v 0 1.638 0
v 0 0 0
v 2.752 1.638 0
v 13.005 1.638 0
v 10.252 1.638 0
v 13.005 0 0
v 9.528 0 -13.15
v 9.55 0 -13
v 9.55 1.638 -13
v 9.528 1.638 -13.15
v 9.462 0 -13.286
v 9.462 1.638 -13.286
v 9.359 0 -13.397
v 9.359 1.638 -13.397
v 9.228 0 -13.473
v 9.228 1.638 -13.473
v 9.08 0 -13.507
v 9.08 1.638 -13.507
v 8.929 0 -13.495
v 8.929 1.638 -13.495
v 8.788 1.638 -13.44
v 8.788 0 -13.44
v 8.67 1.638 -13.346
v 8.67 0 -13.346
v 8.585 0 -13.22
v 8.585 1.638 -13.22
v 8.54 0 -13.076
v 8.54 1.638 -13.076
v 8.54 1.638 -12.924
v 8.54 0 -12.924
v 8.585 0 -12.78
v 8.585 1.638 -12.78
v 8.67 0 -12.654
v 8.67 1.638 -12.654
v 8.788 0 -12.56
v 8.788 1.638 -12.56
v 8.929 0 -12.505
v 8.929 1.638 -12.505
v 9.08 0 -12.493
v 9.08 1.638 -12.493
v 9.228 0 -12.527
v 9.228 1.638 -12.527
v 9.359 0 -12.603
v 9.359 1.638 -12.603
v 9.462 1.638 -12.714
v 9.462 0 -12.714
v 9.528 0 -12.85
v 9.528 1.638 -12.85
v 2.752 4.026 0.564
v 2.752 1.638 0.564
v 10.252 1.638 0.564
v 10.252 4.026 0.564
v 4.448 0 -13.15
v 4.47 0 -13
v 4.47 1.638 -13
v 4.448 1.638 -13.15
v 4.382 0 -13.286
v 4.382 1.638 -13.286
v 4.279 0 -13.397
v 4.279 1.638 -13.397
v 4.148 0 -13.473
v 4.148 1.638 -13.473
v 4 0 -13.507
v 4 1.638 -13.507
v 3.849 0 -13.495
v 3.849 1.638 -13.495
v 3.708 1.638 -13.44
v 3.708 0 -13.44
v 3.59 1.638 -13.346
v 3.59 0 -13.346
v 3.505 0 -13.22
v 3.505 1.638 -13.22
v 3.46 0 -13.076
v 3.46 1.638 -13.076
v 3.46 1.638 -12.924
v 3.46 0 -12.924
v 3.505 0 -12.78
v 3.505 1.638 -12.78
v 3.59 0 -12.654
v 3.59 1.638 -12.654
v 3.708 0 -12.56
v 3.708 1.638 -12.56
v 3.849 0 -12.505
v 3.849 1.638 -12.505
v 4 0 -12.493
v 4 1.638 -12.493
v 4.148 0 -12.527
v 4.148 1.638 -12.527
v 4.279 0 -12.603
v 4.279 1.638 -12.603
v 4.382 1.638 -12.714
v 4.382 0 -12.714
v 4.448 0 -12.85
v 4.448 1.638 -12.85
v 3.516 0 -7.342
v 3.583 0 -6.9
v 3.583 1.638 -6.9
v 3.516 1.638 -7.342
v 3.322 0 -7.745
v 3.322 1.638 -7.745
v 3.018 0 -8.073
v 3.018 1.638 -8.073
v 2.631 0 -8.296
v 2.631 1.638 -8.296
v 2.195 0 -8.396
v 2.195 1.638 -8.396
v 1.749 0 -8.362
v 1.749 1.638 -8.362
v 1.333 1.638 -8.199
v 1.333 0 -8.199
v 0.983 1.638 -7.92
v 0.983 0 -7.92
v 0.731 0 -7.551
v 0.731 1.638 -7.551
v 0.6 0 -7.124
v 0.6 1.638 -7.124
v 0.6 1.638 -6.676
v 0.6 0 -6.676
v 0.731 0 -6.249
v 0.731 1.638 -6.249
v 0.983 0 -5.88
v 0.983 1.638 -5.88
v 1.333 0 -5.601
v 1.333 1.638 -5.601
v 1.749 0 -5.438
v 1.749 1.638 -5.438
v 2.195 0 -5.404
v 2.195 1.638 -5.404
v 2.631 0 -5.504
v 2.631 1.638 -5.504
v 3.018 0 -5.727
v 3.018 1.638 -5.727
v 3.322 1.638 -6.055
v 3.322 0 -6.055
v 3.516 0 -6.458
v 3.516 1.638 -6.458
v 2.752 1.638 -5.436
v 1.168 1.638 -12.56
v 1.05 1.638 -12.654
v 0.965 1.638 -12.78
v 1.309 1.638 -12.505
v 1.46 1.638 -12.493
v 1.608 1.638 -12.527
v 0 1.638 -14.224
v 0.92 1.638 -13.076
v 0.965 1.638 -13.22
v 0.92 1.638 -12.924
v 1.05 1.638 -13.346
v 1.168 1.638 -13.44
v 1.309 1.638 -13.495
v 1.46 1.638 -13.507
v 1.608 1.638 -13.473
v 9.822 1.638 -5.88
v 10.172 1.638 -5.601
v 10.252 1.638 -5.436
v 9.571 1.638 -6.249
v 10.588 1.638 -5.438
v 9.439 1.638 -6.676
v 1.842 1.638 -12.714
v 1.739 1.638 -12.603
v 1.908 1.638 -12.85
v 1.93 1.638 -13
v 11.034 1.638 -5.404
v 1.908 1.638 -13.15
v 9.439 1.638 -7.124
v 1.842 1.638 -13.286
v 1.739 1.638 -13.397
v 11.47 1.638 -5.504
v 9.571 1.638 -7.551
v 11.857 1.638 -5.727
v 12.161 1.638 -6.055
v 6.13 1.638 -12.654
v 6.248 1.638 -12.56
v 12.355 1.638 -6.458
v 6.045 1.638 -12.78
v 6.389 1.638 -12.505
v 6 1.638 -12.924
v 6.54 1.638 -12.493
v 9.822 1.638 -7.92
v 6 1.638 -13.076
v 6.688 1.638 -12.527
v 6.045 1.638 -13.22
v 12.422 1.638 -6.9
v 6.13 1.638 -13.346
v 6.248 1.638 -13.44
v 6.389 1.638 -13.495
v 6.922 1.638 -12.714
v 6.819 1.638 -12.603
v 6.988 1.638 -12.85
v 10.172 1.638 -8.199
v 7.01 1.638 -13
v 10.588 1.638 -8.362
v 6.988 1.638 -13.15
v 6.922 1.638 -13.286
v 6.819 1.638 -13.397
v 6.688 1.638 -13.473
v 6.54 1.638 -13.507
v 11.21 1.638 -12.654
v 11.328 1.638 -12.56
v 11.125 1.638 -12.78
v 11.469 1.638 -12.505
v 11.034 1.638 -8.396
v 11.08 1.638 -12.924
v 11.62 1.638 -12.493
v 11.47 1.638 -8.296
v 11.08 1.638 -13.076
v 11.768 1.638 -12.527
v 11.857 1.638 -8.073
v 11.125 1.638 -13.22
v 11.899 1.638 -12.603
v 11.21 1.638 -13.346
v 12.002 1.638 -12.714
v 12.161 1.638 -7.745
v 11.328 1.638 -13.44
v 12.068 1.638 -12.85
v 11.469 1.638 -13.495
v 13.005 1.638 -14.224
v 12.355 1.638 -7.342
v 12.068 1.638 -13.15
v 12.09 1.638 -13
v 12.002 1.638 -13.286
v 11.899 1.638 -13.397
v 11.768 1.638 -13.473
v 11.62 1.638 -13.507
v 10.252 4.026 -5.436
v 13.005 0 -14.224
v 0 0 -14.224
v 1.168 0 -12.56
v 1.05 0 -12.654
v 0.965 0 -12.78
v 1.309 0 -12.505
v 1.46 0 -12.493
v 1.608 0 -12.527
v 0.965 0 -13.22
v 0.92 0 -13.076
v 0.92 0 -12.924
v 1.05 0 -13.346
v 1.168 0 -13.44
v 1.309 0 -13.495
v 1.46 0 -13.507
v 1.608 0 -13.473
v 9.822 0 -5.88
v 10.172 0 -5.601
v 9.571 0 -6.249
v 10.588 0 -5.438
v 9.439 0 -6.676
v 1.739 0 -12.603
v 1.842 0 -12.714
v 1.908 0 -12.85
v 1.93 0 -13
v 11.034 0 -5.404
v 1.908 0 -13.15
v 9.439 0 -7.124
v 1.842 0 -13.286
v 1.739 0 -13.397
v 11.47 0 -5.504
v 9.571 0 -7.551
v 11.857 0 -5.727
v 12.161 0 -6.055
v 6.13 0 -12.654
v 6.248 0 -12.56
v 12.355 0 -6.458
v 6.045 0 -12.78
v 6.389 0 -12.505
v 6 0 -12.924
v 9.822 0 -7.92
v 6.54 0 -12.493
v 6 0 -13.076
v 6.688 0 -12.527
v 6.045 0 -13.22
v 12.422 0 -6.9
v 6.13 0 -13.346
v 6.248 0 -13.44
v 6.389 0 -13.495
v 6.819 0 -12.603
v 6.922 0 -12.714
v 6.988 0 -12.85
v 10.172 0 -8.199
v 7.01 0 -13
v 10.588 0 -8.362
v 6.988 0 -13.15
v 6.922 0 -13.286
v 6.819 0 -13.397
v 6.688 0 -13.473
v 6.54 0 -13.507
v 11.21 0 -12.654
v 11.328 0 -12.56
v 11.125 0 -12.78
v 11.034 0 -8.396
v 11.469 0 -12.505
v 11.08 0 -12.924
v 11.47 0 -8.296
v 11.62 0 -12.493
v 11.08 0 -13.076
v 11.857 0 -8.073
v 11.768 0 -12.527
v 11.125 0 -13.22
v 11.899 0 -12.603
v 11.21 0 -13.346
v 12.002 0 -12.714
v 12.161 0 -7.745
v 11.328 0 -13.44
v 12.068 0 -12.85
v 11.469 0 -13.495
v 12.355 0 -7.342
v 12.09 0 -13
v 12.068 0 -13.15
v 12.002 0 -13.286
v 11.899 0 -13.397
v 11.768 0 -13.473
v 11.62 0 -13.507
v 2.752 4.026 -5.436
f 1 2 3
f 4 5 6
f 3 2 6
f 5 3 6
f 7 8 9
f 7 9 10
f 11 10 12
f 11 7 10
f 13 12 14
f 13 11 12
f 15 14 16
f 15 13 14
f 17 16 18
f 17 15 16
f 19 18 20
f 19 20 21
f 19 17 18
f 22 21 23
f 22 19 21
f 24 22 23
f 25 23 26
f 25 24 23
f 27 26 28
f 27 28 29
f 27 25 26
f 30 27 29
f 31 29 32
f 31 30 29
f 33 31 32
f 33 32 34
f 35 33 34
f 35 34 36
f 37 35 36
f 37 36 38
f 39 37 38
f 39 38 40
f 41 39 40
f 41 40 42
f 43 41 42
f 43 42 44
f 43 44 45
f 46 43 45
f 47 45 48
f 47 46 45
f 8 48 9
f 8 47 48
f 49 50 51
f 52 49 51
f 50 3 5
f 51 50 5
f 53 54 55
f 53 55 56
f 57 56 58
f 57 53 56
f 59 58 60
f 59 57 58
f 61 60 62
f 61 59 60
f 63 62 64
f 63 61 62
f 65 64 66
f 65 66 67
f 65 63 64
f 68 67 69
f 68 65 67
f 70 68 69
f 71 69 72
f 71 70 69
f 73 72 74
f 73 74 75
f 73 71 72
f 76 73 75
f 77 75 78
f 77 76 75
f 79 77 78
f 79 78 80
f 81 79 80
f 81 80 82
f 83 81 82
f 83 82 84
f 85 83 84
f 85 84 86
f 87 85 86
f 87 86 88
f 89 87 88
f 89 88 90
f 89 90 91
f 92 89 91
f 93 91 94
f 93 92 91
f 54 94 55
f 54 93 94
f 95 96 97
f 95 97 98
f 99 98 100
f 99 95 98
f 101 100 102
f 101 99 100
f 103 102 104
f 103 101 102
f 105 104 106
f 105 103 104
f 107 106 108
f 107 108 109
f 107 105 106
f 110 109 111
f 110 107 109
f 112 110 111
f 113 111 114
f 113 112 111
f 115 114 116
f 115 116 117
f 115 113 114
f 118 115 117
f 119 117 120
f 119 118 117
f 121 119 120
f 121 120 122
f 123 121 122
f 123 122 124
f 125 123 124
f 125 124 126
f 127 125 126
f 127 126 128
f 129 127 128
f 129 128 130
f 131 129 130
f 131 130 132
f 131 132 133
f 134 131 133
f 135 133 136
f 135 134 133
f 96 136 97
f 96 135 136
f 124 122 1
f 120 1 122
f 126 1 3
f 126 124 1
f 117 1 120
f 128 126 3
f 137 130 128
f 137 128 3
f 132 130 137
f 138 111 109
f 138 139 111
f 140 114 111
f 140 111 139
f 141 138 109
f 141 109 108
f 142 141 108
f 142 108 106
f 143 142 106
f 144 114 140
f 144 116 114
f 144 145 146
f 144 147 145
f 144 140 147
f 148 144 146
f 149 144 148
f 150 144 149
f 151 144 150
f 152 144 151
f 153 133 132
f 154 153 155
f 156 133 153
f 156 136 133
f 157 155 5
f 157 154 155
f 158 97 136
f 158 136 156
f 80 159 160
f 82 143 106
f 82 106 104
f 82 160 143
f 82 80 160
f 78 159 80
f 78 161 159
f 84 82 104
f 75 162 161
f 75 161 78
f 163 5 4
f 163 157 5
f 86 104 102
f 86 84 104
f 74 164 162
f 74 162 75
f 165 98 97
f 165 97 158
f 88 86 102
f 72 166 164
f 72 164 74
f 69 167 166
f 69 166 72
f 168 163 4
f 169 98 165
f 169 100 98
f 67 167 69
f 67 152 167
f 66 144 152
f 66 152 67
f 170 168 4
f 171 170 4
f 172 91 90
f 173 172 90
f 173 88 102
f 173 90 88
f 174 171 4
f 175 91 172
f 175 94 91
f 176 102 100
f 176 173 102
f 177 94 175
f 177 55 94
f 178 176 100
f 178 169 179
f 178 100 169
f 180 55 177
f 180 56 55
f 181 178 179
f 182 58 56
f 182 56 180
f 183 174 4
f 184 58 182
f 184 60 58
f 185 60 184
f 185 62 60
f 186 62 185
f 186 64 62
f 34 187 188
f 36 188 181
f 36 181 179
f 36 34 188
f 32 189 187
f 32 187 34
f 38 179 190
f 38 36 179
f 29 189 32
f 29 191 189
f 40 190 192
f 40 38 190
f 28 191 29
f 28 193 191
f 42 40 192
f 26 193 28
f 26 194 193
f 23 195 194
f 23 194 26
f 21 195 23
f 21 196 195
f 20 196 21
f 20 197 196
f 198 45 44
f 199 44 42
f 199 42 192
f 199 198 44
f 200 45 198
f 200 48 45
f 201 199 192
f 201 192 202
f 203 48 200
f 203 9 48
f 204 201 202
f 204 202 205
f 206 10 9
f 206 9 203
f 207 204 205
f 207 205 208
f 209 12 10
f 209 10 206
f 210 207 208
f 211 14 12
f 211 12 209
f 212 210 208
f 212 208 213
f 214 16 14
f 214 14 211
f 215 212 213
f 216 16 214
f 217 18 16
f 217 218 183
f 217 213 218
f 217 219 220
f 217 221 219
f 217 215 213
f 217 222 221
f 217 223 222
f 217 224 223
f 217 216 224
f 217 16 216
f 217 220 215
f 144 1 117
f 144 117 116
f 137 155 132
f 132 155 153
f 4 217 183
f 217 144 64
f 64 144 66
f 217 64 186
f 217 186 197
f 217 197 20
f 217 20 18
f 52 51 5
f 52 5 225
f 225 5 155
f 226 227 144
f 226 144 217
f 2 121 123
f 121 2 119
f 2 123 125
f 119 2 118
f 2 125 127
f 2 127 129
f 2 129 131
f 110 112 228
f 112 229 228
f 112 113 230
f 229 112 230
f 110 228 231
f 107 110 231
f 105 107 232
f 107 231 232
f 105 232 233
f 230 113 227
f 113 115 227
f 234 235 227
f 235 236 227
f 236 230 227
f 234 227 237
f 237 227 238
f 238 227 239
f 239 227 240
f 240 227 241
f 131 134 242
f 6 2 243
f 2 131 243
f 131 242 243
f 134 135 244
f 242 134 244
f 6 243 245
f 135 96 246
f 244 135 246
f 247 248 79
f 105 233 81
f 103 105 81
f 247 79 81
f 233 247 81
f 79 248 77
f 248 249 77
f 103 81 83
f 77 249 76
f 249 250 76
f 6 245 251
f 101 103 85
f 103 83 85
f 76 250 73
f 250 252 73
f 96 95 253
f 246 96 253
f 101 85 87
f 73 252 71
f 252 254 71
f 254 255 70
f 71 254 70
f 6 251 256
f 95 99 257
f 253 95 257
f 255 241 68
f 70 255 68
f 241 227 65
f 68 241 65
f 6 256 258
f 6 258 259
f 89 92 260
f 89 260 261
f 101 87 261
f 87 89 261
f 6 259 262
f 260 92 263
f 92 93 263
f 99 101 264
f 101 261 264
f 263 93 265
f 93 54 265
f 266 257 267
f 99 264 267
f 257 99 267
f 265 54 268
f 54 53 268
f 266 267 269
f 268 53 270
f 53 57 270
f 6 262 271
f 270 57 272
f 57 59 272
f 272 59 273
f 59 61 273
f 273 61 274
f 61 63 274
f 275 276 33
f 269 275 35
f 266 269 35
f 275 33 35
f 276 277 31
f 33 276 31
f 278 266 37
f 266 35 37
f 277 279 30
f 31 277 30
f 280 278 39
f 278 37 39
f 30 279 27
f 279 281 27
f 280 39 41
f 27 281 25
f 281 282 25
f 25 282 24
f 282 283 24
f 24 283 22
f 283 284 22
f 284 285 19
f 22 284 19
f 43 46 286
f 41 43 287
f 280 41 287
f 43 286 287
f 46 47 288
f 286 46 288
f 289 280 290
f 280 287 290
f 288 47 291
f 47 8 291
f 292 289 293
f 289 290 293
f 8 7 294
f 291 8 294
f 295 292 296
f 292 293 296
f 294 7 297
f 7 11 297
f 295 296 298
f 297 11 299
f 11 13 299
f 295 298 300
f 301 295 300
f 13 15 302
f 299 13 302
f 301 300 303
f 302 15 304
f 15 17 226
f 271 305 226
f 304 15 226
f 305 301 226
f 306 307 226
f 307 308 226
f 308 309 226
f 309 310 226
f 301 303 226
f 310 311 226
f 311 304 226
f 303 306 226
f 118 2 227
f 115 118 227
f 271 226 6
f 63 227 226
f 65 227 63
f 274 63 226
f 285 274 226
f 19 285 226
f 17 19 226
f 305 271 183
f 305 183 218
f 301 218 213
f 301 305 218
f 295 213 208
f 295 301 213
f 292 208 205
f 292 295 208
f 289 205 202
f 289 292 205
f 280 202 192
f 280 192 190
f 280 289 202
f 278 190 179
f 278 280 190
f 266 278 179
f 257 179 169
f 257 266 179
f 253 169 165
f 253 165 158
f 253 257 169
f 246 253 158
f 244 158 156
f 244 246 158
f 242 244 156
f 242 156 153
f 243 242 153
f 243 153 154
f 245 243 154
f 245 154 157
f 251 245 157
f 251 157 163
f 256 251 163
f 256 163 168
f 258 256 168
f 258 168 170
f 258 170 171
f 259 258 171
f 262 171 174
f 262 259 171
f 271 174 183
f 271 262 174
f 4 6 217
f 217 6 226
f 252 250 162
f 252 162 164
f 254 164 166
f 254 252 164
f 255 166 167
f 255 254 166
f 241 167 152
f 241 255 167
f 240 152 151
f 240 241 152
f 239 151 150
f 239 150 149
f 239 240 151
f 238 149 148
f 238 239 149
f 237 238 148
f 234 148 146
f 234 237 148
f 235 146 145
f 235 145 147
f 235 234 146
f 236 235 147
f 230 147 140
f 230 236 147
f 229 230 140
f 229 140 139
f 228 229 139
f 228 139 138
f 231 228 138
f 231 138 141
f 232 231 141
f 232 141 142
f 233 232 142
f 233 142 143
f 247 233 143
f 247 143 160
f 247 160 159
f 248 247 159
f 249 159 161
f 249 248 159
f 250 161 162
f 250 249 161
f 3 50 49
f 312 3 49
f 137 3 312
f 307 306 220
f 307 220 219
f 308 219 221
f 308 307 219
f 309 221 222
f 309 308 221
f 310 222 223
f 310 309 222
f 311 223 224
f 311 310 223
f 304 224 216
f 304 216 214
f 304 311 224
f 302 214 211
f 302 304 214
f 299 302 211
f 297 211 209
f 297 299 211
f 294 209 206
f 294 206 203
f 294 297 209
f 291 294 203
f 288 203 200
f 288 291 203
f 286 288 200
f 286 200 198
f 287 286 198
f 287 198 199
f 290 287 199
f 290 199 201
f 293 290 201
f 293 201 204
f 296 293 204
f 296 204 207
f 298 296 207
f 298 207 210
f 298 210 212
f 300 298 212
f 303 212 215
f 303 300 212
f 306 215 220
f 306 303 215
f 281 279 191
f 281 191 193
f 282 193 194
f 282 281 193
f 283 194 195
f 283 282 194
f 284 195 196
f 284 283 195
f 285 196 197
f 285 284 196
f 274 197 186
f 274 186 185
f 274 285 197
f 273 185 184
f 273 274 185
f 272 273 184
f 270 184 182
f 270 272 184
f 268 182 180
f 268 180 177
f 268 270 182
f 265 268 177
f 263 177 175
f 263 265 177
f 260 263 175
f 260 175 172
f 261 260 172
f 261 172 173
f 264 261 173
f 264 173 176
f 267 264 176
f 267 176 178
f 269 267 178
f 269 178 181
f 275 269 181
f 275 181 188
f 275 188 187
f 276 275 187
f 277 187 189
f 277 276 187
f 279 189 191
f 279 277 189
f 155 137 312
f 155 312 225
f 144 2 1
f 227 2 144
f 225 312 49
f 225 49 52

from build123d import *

# Parameters (mm, degrees)
SKETCH1_W           = 13.0048
SKETCH1_H           = 14.224
SKETCH1_R           = 0.508
SKETCH1_R_2         = 1.5
BOSS_EXTRUDE1_DEPTH = 1.6383
SKETCH2_W           = 7.5
SKETCH2_H           = 6
BOSS_EXTRUDE3_DEPTH = 2.3876


with BuildPart() as part:
    # Sketch1 → Boss-Extrude1 (new body)
    with BuildSketch(Plane(origin=(0, 0, 0), x_dir=(1, 0, 0), z_dir=(0, 1, 0))):
        with Locations((6.5024, 7.112)):
            Rectangle(SKETCH1_W, SKETCH1_H)
        with Locations((1.4224, 13)):
            Circle(SKETCH1_R, mode=Mode.SUBTRACT)
        with Locations((3.9624, 13)):
            Circle(SKETCH1_R, mode=Mode.SUBTRACT)
        with Locations((6.5024, 13)):
            Circle(SKETCH1_R, mode=Mode.SUBTRACT)
        with Locations((9.0424, 13)):
            Circle(SKETCH1_R, mode=Mode.SUBTRACT)
        with Locations((11.5824, 13)):
            Circle(SKETCH1_R, mode=Mode.SUBTRACT)
        with Locations((2.0828, 6.9)):
            Circle(SKETCH1_R_2, mode=Mode.SUBTRACT)
        with Locations((10.922, 6.9)):
            Circle(SKETCH1_R_2, mode=Mode.SUBTRACT)
    extrude(amount=BOSS_EXTRUDE1_DEPTH)

    # Sketch2 → Boss-Extrude3 (add)
    with BuildSketch(Plane(origin=(0, 1.6383, 0), x_dir=(1, 0, 0), z_dir=(0, 1, 0))):
        with Locations((6.5024, 2.4356)):
            Rectangle(SKETCH2_W, SKETCH2_H)
    extrude(amount=BOSS_EXTRUDE3_DEPTH)


solid = part.part
